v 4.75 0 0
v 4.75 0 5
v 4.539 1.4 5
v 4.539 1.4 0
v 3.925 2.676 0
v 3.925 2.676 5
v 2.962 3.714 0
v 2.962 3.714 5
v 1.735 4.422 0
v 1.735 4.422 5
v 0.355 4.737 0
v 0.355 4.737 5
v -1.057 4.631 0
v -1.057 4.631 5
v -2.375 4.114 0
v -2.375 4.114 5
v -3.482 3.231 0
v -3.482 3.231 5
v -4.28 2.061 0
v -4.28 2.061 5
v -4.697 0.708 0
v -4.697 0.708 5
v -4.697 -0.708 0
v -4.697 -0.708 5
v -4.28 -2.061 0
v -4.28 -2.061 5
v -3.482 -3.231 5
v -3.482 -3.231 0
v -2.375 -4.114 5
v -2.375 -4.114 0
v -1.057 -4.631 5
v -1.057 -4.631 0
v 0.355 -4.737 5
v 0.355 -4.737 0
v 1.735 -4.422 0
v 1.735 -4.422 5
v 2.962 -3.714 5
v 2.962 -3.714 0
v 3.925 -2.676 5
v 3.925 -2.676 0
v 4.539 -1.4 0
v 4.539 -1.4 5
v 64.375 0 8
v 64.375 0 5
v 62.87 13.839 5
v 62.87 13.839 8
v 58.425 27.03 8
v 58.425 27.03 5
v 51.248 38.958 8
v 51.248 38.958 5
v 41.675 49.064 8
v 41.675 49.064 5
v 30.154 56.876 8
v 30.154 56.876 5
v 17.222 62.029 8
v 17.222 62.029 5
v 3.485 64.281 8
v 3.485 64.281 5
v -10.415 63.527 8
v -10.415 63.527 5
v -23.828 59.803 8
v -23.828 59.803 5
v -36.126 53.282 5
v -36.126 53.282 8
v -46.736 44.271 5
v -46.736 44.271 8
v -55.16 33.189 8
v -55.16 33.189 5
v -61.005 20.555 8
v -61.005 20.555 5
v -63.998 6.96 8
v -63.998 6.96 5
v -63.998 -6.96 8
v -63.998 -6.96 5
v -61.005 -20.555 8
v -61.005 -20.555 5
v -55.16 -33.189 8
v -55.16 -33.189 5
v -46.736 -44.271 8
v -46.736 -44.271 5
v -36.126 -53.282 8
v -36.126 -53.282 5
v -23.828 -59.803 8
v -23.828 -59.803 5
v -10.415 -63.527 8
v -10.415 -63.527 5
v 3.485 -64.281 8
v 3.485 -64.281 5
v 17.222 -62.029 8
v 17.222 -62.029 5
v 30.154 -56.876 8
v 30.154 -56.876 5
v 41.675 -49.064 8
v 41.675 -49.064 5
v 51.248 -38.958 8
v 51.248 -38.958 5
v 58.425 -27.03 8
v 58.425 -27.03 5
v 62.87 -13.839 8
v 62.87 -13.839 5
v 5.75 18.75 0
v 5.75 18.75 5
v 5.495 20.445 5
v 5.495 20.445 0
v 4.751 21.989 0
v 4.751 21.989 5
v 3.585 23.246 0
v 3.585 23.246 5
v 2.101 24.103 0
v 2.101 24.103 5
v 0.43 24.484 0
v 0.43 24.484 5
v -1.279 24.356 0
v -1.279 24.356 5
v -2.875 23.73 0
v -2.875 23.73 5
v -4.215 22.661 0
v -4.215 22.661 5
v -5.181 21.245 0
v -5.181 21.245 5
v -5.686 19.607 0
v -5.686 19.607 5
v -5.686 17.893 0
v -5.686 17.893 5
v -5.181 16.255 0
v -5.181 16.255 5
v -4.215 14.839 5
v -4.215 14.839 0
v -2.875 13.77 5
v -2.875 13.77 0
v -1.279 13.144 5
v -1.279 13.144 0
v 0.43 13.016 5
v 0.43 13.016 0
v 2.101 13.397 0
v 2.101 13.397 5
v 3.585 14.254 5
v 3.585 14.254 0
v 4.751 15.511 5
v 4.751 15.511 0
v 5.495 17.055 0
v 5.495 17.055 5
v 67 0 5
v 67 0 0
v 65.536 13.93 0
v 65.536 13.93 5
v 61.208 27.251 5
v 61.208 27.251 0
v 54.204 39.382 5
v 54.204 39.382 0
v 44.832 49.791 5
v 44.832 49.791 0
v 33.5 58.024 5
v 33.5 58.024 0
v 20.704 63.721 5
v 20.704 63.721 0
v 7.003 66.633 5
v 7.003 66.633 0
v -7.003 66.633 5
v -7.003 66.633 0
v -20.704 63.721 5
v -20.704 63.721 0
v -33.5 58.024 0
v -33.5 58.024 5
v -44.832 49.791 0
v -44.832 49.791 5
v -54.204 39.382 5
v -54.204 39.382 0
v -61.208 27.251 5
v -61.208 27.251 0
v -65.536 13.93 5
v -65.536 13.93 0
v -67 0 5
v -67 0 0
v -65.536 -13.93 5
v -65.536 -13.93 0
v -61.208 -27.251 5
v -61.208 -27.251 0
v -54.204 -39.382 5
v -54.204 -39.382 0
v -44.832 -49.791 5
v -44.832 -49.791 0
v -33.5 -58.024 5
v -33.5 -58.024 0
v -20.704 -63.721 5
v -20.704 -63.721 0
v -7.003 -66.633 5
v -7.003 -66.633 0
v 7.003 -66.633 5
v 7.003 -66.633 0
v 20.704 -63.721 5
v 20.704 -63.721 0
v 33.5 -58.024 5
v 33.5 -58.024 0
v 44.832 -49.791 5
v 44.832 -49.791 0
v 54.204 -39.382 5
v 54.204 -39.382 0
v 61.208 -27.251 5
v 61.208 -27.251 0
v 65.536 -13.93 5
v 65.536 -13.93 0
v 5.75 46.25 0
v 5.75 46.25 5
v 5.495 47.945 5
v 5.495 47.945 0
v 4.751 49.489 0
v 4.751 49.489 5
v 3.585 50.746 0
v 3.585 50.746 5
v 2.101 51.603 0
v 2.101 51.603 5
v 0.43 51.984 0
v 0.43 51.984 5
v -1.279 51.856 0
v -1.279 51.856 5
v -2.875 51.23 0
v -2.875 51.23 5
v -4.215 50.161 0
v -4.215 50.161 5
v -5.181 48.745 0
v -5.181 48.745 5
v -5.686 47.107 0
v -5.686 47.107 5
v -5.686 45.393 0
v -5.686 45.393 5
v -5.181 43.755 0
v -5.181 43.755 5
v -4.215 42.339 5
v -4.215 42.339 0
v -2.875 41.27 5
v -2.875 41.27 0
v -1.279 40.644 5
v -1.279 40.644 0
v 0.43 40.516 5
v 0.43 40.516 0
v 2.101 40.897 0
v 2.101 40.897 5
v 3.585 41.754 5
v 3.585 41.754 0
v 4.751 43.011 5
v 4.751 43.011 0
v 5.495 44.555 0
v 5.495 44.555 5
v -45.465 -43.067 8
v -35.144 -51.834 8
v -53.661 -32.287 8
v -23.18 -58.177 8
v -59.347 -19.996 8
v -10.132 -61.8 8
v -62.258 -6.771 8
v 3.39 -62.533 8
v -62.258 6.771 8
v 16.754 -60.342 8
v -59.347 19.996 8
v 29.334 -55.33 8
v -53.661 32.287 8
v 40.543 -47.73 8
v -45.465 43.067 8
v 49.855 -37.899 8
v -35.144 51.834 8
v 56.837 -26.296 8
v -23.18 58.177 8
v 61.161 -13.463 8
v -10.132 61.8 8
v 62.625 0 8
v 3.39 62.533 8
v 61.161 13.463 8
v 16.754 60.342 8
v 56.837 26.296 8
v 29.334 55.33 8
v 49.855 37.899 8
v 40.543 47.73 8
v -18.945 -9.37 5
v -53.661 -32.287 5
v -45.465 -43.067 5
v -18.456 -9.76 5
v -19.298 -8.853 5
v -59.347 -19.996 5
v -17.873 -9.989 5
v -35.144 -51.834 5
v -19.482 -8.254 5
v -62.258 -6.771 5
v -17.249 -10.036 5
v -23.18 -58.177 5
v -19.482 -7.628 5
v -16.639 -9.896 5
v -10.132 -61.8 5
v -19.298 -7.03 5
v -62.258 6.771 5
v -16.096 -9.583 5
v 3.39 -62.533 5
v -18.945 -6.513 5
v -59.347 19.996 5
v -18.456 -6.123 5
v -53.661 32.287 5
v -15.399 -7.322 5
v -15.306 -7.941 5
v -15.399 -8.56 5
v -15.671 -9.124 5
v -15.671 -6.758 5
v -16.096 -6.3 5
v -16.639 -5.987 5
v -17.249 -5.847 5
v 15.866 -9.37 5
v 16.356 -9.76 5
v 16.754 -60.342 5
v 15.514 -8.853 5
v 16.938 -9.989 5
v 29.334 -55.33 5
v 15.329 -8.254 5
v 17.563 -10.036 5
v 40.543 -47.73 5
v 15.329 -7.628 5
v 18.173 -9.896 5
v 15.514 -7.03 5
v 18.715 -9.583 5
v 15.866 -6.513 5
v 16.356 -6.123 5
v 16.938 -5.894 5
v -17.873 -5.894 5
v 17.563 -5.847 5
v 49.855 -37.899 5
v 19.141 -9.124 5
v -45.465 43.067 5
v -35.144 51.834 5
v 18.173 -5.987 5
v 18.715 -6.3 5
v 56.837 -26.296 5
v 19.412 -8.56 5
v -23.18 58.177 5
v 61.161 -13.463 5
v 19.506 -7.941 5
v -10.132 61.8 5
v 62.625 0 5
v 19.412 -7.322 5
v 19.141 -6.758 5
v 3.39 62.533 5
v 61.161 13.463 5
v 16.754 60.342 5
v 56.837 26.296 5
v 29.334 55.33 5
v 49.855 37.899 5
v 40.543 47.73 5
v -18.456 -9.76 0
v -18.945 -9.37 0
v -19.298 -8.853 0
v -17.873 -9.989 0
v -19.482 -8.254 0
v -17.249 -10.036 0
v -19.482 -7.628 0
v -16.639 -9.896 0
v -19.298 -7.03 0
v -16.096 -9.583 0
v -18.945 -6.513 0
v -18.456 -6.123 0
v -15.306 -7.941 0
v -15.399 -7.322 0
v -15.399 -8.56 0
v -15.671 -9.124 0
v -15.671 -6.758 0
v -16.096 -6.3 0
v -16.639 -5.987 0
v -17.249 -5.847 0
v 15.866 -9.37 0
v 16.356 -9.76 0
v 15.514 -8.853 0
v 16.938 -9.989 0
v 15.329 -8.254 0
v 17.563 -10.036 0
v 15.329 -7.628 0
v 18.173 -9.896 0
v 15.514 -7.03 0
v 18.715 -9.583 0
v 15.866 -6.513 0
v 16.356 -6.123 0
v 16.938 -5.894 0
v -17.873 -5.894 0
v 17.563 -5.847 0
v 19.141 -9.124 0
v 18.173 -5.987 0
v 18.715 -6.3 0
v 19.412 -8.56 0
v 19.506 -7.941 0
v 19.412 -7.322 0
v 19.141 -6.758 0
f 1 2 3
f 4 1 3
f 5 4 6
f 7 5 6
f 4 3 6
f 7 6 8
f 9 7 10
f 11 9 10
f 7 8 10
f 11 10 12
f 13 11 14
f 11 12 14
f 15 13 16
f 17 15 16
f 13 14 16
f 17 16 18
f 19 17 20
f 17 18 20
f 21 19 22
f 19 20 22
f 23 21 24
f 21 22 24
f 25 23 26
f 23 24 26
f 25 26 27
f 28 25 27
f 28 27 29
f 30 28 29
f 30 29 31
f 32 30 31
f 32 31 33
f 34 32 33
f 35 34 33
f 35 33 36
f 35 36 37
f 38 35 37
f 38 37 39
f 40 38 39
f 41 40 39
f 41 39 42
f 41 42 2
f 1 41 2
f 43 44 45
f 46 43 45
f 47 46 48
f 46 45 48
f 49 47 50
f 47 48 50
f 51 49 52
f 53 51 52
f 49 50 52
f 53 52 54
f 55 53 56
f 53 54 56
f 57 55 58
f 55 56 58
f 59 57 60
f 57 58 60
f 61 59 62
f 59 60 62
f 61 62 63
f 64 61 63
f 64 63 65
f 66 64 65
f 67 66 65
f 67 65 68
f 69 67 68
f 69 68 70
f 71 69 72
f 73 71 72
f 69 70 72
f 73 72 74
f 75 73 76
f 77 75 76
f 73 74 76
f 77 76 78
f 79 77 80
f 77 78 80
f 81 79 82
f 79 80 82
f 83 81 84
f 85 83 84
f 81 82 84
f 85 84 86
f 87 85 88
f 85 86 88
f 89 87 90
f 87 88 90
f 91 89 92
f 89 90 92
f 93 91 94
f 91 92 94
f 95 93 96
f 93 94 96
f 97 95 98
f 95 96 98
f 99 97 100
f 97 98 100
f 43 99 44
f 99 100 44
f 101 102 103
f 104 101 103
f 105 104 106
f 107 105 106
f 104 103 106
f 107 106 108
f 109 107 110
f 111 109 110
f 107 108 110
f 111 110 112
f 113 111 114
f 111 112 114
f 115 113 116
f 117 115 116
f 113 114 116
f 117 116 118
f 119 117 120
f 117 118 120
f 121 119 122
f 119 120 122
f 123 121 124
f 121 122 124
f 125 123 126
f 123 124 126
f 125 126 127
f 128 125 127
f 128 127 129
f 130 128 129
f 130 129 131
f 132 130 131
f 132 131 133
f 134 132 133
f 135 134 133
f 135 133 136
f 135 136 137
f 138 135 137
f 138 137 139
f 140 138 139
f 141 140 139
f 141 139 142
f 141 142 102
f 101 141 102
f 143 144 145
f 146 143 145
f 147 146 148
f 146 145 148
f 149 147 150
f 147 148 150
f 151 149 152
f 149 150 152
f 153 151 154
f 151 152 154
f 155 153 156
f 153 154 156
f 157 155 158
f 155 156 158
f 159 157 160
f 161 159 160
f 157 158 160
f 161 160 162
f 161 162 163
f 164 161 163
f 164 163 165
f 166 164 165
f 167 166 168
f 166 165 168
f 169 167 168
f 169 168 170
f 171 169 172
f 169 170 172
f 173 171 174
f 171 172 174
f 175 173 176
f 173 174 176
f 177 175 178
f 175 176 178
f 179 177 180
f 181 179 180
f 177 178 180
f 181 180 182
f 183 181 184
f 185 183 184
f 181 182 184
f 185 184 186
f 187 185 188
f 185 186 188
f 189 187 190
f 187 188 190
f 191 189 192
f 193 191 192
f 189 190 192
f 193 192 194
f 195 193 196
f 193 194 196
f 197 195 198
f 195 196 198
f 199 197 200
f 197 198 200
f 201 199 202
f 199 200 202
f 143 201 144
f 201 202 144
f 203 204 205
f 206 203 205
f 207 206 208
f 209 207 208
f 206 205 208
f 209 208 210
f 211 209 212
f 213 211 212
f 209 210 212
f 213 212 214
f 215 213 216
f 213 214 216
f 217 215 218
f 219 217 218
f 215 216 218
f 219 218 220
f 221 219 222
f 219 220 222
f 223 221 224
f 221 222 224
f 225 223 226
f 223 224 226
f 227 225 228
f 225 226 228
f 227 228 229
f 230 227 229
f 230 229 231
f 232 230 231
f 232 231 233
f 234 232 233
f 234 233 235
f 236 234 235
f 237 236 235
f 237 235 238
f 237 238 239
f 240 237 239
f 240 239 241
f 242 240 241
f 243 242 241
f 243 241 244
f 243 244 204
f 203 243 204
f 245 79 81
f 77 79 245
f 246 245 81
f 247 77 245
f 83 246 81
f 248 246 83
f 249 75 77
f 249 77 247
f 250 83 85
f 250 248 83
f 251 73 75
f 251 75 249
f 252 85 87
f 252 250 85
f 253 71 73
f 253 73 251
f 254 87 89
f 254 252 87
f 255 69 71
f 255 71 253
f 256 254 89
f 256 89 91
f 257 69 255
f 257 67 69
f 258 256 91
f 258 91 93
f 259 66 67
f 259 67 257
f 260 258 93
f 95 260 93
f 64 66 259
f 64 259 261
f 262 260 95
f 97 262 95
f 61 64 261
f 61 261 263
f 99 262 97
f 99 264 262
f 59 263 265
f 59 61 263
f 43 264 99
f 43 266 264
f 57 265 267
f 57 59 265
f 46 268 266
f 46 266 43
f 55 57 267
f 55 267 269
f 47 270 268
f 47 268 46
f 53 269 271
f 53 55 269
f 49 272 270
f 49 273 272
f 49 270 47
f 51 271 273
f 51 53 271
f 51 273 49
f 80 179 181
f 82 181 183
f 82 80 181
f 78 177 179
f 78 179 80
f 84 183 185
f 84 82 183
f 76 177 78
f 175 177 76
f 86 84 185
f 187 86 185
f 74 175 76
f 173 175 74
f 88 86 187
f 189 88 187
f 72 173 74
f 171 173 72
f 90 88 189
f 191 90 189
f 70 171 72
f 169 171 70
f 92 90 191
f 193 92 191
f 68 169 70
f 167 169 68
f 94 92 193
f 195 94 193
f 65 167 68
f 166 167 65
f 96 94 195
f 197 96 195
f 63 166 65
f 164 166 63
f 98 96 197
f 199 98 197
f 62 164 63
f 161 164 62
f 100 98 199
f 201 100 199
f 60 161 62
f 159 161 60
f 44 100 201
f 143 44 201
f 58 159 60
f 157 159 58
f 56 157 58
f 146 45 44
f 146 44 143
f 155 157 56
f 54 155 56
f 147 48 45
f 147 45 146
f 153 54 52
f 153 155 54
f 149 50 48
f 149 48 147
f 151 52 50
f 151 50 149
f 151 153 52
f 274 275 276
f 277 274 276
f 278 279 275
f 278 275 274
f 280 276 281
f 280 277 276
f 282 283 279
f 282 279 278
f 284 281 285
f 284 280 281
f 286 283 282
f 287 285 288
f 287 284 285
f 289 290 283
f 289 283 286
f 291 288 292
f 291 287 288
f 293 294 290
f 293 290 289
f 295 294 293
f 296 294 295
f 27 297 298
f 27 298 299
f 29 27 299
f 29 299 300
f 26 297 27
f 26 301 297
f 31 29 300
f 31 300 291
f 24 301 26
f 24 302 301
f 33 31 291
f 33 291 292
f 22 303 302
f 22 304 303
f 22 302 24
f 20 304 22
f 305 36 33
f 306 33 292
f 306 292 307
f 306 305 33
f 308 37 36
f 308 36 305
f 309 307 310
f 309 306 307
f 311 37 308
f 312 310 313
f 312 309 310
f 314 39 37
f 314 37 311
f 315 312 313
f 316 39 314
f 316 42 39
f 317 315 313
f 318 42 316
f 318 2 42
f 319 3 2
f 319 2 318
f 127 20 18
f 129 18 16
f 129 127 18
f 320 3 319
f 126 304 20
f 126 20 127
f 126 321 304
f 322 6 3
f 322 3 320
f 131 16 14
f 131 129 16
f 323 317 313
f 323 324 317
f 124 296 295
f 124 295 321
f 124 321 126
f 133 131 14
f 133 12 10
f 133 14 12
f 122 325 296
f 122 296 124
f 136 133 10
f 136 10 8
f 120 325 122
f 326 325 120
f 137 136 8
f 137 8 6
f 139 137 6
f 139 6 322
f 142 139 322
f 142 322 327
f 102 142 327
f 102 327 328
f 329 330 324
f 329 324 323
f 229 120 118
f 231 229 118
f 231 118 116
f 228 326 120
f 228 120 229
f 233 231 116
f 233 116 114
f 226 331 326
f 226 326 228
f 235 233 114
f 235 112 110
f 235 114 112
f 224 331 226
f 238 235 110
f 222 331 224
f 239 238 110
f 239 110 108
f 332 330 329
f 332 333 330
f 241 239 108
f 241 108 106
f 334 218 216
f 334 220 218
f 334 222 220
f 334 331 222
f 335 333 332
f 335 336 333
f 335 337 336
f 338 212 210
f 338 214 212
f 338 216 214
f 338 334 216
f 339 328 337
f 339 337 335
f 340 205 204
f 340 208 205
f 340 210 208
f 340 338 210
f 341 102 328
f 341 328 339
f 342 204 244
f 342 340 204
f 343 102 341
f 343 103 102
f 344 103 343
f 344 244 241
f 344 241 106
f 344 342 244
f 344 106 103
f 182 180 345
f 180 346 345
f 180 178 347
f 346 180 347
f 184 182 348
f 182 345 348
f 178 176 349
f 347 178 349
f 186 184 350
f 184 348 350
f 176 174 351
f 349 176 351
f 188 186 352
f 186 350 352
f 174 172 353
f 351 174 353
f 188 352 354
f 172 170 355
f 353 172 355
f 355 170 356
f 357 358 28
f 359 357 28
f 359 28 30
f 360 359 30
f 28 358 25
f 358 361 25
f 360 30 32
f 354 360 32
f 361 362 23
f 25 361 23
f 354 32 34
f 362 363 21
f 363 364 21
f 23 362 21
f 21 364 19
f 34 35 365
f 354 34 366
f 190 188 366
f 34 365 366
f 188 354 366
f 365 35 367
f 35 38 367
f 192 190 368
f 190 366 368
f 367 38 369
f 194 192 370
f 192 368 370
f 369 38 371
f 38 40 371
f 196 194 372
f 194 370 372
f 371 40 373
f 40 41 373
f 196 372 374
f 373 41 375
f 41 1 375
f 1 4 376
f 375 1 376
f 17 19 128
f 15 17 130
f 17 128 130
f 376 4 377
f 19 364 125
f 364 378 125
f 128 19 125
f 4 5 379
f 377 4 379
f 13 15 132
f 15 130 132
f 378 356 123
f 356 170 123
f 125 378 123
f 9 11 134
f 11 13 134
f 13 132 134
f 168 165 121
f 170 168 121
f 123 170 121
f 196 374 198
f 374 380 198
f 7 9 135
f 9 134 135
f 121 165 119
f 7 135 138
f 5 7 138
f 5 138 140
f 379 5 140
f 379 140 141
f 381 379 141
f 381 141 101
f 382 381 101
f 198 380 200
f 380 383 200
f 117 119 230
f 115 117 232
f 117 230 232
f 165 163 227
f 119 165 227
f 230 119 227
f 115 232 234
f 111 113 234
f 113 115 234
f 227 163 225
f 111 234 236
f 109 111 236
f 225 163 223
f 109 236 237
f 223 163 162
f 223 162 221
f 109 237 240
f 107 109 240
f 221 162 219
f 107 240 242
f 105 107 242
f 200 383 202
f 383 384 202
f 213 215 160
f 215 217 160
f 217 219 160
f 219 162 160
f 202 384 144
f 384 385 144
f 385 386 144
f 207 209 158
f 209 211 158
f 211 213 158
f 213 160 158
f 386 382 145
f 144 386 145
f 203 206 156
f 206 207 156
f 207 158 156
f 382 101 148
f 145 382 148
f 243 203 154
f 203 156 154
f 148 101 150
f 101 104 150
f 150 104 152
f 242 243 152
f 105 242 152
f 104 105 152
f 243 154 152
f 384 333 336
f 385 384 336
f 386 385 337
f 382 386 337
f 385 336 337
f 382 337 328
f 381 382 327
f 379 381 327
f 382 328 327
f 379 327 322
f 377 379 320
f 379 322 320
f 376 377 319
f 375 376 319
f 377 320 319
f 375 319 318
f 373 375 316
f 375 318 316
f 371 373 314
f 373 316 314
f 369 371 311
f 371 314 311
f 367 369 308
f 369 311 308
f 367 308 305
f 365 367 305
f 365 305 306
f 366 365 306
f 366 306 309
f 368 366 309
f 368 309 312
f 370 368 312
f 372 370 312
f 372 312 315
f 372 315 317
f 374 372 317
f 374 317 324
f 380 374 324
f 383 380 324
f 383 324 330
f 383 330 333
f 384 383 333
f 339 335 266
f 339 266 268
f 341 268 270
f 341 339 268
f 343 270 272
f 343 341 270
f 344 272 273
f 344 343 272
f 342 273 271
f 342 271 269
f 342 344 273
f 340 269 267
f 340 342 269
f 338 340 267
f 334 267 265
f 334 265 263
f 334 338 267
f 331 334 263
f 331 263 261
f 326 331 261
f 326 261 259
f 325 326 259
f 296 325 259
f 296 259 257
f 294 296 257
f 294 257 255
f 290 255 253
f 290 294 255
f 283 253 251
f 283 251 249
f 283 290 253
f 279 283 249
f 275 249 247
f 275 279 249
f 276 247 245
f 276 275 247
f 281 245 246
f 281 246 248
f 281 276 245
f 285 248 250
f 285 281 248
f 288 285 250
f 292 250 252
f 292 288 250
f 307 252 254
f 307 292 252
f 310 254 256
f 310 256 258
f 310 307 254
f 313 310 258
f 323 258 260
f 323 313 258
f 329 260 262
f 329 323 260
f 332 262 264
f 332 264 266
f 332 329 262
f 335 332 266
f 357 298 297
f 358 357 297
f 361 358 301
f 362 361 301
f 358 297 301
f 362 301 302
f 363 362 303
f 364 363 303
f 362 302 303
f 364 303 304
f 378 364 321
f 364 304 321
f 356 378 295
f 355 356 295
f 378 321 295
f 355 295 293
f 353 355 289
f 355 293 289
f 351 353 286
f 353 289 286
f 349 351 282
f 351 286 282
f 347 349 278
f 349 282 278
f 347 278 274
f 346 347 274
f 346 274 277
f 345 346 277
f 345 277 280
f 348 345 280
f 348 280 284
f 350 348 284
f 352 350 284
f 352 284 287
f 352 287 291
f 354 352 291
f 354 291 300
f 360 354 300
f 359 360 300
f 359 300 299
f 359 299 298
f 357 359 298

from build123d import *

# Parameters (mm, degrees)
F0_R      = 67
F1_DEPTH  = 5
F3_R      = 64.375
F3_R_2    = 62.625
F5_DEPTH  = 3
F7_R      = 2.1
F8_DEPTH  = 5.001
F6_R      = 5.75
F6_R_2    = 4.75
F9_DEPTH  = 5.001
F10_R     = 6.75
F10_R_2   = 5.75
F11_DEPTH = 0.5
F12_DEPTH = 0.5


with BuildPart() as f1:
    # F0 (on Top) → F1 (new body)
    with BuildSketch(Plane.XY):
        Circle(F0_R)
    extrude(amount=F1_DEPTH)

    # F3 (on face) → F5 (join)
    with BuildSketch(Plane.XY.offset(5)):
        Circle(F3_R)
        Circle(F3_R_2, mode=Mode.SUBTRACT)
    extrude(amount=F5_DEPTH)

    # F7 (on face) → F8 (cut, through all)
    with BuildSketch(Plane.XY.offset(5)):
        with Locations((17.4057390541, -7.9414527863)):
            Circle(F7_R)
        with Locations((-17.4057390541, -7.9414527863)):
            Circle(F7_R)
    extrude(amount=-F8_DEPTH, mode=Mode.SUBTRACT)

    # F6 (on face) → F9 (cut, through all)
    with BuildSketch(Plane.XY.offset(5)):
        with Locations((0, 46.25)):
            Circle(F6_R)
        with Locations((0, 18.75)):
            Circle(F6_R)
        Circle(F6_R_2)
    extrude(amount=-F9_DEPTH, mode=Mode.SUBTRACT)

    # F10 (on Top) → F11 (cut)
    with BuildSketch(Plane.XY):
        with Locations((0, 46.25)):
            Circle(F10_R)
        with Locations((0, 18.75)):
            Circle(F10_R)
        Circle(F10_R_2)
    extrude(amount=-F11_DEPTH, mode=Mode.SUBTRACT)

    # F10 (on Top) → F12 (cut)
    with BuildSketch(Plane.XY):
        with Locations((0, 46.25)):
            Circle(F10_R)
    extrude(amount=-F12_DEPTH, mode=Mode.SUBTRACT)


solid = f1.part
